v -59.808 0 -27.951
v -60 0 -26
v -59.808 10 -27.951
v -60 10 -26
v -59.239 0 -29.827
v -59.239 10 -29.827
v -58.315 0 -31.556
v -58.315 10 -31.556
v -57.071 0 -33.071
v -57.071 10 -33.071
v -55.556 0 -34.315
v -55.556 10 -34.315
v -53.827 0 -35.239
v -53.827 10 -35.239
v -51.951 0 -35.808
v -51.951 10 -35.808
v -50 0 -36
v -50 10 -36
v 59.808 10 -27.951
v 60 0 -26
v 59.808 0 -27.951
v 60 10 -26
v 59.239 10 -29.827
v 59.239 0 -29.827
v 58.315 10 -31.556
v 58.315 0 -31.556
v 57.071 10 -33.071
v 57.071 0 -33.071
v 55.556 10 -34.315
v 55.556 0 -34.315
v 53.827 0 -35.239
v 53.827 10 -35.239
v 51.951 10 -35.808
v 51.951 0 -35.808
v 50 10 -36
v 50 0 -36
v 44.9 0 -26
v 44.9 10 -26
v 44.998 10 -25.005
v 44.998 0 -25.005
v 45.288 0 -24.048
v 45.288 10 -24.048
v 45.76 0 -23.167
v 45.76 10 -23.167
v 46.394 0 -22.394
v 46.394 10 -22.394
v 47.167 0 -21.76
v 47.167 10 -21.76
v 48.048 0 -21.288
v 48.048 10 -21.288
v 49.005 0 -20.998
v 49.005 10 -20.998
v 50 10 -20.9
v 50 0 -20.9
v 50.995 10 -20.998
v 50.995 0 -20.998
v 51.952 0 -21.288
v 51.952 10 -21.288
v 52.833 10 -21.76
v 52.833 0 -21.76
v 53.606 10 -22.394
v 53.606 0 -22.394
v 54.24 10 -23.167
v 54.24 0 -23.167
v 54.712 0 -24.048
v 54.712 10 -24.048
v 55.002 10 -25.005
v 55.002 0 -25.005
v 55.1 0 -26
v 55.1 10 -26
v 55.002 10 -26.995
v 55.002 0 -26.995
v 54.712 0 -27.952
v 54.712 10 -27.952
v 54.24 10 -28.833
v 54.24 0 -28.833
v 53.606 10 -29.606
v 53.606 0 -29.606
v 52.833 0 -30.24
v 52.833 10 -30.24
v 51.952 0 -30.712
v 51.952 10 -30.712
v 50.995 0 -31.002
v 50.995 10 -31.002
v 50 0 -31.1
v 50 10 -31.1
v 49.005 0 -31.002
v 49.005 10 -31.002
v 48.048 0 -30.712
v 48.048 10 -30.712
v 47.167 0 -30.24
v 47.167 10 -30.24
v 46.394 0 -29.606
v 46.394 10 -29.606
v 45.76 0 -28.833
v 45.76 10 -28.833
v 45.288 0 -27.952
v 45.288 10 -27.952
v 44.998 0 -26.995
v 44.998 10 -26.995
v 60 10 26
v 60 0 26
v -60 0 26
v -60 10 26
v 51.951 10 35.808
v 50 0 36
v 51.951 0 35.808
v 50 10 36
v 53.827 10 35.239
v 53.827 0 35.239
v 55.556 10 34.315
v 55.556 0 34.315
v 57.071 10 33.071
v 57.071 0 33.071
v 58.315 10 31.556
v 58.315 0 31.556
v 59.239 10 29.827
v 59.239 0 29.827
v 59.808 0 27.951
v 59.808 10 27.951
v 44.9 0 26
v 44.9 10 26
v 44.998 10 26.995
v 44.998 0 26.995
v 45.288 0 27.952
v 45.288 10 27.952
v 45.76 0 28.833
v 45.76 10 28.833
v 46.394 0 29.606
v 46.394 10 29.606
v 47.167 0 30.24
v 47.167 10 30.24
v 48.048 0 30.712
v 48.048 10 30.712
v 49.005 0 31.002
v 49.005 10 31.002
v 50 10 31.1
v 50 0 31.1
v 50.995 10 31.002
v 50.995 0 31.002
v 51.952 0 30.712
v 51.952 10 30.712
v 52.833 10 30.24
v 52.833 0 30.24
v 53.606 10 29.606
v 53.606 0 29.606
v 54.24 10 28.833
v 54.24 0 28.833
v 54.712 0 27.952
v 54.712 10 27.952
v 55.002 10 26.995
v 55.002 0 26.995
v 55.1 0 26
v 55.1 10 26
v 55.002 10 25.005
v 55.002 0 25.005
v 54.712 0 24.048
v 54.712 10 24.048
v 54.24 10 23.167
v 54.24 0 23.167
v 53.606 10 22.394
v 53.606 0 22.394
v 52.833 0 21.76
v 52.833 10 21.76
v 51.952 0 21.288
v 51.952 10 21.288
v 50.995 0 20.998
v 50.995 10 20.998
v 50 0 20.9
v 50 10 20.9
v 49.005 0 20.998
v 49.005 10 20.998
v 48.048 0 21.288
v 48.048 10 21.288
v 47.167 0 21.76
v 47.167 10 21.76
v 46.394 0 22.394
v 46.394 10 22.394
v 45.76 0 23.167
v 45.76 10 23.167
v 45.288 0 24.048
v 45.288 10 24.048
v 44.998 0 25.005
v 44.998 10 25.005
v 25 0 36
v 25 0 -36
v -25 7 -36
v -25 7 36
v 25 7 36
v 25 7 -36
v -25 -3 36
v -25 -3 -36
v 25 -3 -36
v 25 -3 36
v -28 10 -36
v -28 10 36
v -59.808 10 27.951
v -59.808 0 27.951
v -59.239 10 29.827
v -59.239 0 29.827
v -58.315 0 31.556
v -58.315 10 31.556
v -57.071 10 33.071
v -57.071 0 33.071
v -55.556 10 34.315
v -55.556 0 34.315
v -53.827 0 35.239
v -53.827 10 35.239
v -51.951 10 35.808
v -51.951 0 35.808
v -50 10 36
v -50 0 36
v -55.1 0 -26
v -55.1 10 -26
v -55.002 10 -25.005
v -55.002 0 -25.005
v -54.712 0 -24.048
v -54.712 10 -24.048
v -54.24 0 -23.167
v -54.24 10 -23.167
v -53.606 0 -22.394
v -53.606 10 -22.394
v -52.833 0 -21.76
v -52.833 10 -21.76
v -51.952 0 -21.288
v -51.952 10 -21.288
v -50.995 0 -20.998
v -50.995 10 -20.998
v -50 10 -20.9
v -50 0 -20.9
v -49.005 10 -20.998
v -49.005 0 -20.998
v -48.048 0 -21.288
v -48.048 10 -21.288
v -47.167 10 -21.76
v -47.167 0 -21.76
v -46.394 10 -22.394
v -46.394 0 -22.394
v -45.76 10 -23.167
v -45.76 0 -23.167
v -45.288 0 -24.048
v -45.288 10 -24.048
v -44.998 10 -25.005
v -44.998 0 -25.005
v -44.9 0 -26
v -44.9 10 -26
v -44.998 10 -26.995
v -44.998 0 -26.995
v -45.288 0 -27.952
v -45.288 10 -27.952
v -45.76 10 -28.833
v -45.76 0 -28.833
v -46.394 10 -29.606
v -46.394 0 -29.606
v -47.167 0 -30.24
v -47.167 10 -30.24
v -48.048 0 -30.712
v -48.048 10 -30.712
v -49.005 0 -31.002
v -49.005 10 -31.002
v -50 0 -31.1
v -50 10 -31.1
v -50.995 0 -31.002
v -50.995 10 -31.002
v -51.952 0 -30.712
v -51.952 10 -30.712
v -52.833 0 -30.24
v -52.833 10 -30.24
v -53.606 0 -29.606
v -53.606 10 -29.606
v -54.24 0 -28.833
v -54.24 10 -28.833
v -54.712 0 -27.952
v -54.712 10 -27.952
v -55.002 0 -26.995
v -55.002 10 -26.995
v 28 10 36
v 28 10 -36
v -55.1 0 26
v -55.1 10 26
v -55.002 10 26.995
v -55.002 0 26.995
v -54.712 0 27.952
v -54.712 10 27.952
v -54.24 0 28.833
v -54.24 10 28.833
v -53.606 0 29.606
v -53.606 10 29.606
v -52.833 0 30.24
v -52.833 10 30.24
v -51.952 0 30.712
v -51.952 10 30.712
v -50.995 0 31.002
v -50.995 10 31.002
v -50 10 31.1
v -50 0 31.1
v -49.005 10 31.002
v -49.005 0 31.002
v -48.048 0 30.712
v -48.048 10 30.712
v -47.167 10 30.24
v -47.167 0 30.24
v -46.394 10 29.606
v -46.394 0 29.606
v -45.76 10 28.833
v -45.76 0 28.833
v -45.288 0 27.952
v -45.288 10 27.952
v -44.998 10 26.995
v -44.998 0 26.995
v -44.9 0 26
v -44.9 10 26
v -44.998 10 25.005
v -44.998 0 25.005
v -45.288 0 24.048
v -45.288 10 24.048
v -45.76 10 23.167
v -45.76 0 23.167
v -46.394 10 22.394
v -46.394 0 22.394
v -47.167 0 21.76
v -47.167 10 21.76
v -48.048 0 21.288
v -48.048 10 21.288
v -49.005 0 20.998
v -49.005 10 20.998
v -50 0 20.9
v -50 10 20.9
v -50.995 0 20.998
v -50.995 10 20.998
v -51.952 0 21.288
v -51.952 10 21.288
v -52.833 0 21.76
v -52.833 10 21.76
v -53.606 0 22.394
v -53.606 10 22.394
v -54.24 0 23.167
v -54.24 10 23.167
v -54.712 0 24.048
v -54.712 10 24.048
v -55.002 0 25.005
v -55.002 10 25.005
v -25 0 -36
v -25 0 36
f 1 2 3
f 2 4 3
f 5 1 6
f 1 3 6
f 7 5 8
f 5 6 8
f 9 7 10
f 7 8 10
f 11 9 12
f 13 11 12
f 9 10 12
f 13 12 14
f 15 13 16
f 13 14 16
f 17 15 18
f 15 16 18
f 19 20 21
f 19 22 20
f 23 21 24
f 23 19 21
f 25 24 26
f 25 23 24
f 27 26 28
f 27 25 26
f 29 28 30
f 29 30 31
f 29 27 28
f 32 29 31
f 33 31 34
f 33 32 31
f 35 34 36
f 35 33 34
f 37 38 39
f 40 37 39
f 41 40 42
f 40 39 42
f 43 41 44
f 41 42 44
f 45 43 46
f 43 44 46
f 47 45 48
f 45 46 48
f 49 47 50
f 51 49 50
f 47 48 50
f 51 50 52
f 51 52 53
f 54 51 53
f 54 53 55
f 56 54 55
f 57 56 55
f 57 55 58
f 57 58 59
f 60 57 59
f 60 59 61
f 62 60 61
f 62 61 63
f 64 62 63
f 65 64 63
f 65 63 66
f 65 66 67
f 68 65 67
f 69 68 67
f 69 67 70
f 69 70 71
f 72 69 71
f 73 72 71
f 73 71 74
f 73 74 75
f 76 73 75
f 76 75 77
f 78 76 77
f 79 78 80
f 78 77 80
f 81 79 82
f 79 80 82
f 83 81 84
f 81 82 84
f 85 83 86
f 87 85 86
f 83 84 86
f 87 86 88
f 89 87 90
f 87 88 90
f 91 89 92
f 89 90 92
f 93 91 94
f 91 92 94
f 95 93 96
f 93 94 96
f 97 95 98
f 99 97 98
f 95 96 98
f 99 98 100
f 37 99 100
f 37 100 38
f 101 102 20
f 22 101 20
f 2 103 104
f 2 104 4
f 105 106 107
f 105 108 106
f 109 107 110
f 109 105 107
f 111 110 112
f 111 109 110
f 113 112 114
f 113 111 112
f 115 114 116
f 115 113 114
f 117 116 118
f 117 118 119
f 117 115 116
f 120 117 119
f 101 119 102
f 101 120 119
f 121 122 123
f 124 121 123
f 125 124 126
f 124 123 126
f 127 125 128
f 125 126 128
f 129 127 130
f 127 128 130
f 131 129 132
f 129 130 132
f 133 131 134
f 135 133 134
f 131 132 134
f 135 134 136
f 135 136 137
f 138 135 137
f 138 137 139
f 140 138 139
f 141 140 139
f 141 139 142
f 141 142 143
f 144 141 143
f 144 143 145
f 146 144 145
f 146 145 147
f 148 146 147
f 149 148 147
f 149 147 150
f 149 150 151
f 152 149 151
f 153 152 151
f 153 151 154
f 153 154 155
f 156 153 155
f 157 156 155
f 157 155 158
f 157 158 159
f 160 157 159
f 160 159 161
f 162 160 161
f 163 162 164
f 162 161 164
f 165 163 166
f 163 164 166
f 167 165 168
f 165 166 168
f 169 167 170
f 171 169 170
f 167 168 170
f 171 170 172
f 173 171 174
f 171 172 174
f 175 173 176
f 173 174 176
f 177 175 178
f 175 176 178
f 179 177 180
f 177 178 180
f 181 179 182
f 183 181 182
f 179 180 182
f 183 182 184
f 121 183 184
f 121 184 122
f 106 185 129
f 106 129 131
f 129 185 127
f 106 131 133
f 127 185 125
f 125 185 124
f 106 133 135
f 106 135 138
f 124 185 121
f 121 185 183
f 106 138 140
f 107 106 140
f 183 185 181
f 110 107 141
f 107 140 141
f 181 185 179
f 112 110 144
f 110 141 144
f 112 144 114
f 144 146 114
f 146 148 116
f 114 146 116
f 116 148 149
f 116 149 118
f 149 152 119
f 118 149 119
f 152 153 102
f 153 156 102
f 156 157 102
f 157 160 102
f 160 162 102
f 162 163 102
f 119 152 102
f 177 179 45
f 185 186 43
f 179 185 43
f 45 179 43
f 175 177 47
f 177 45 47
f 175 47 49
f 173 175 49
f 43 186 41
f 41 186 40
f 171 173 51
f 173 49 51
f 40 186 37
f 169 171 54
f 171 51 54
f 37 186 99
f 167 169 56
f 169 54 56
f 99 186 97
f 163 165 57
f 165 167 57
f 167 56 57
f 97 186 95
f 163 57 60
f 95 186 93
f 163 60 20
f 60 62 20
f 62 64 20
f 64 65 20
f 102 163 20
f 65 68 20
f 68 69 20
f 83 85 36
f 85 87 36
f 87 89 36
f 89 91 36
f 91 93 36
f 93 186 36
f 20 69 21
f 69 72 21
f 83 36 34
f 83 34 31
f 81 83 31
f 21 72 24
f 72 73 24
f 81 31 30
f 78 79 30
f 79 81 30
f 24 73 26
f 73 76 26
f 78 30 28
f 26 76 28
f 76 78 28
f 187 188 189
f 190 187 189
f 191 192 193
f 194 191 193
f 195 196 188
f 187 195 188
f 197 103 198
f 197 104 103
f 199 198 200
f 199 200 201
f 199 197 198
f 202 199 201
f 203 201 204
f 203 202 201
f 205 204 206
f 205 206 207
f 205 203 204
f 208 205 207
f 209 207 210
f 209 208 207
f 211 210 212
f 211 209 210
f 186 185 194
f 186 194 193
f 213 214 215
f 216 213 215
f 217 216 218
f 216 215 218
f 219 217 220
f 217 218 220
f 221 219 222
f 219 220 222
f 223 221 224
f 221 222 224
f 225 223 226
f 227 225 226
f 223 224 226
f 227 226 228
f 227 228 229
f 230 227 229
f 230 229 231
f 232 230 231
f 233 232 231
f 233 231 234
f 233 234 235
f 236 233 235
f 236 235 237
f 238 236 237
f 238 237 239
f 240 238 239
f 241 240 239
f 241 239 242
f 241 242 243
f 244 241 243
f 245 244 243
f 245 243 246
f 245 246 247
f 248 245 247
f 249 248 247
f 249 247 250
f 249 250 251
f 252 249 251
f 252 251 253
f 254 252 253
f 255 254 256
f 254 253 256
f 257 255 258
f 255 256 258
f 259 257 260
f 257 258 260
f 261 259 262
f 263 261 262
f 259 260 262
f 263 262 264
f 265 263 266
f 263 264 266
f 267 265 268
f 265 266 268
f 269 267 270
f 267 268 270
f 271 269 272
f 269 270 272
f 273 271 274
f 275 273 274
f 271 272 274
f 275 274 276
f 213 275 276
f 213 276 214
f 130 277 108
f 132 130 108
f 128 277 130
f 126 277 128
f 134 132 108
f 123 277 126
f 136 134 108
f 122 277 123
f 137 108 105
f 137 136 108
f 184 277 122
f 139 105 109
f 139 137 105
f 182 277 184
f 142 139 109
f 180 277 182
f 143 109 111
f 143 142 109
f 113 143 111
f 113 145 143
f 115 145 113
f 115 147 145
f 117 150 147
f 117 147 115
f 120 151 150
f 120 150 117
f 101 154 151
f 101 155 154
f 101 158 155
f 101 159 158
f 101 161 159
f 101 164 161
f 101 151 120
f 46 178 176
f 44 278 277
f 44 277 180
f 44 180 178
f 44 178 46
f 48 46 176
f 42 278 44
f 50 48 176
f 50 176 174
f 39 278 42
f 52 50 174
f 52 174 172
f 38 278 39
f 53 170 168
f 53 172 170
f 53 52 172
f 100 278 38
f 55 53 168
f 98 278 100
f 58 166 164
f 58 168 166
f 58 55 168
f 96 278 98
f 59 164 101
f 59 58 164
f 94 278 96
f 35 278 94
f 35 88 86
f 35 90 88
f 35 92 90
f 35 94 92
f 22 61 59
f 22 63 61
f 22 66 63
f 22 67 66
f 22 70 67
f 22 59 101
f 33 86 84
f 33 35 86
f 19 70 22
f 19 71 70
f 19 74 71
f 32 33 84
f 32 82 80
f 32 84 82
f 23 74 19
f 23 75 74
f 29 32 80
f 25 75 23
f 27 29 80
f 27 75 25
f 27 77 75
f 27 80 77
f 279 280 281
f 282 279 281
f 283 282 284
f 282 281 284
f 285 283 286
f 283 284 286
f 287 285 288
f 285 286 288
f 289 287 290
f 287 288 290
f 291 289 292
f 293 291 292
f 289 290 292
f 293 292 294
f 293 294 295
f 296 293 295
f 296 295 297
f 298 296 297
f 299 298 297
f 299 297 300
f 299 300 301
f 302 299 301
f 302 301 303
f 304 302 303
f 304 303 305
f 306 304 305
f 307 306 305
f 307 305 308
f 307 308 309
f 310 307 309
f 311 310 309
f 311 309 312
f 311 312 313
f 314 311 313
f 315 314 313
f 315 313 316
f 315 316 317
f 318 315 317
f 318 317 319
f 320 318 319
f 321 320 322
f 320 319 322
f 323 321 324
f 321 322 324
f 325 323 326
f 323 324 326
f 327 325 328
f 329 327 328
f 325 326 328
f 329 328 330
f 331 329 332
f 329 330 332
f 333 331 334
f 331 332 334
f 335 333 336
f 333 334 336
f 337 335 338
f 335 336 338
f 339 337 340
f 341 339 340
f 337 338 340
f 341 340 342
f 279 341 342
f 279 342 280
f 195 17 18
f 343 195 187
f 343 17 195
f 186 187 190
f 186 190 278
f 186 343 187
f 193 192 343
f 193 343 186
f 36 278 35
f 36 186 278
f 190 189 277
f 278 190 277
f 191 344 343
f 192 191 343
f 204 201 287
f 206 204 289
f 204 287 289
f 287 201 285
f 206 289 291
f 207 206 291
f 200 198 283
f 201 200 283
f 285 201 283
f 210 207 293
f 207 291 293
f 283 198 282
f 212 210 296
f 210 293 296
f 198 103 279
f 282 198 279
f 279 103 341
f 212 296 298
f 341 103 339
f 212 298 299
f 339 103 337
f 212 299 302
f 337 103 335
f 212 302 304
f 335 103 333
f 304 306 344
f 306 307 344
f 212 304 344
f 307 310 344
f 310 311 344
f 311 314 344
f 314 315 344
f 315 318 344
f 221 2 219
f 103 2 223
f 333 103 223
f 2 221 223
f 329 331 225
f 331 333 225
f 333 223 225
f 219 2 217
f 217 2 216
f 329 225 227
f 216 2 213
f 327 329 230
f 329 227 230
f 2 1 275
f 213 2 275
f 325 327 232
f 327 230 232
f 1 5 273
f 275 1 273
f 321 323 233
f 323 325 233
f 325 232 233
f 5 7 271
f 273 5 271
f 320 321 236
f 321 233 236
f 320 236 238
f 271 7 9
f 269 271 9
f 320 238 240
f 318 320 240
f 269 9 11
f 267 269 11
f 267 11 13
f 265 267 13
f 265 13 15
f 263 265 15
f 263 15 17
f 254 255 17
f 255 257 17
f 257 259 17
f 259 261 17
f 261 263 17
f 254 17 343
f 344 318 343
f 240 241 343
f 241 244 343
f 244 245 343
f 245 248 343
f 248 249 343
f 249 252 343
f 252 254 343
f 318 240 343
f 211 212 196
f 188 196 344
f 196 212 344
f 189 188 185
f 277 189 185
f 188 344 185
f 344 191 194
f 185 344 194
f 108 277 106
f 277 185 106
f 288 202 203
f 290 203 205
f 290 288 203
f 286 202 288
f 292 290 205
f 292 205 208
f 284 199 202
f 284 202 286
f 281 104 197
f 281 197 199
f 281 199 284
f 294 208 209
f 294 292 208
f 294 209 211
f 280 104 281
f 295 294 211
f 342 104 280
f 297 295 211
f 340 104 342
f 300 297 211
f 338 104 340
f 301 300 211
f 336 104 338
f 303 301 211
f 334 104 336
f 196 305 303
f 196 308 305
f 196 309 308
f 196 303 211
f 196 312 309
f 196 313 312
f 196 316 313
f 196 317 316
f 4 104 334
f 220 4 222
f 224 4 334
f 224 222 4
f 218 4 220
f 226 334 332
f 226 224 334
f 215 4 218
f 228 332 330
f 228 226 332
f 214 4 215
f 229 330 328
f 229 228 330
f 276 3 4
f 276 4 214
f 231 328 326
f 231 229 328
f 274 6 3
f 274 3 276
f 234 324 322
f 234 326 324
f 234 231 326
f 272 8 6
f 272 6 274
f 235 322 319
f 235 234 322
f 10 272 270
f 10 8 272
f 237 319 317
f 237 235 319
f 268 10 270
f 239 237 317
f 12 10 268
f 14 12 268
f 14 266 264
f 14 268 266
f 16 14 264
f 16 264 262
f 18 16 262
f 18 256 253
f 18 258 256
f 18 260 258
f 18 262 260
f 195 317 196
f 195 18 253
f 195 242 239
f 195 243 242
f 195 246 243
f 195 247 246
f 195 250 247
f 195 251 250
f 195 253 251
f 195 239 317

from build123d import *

# Parameters (mm, degrees)
SKETCH1_W              = 120
SKETCH1_H              = 72
BOSS_EXTRUDE1_DEPTH    = 10
FILLET1_R              = 10
M12_TAPPED_HOLE1_D     = 10.2
M12_TAPPED_HOLE1_DEPTH = 10
SKETCH6_W              = 50
SKETCH6_H              = 72
BOSS_EXTRUDE2_DEPTH    = 3
CUT_EXTRUDE1_DEPTH     = 73


with BuildPart() as part:
    # Sketch1 → Boss-Extrude1 (new body)
    with BuildSketch(Plane(origin=(0, 0, 0), x_dir=(1, 0, 0), z_dir=(0, 1, 0))):
        Rectangle(SKETCH1_W, SKETCH1_H)
    extrude(amount=BOSS_EXTRUDE1_DEPTH)

    # Fillet1
    fillet1_edges = [part.edges().sort_by_distance(p)[0] for p in [
        (60, 5, 36),
        (-60, 5, 36),
        (-60, 5, -36),
        (60, 5, -36),
    ]]
    fillet(fillet1_edges, radius=FILLET1_R)

    # M12 Tapped Hole1
    with Locations(Plane.XZ):
        with Locations((50, -26), (50, 26), (-50, 26), (-50, -26)):
            Hole(M12_TAPPED_HOLE1_D / 2, depth=M12_TAPPED_HOLE1_DEPTH)

    # Sketch6 → Boss-Extrude2 (add)
    with BuildSketch(Plane(origin=(0, 0, 0), x_dir=(1, 0, 0), z_dir=(0, 1, 0))):
        Rectangle(SKETCH6_W, SKETCH6_H)
    extrude(amount=-BOSS_EXTRUDE2_DEPTH)

    # Sketch11 → Cut-Extrude1 (cut, through all)
    with BuildSketch(Plane.XY.offset(36)):
        Polygon((-28, 10), (-25, 7), (25, 7), (28, 10), align=None)
    extrude(amount=-CUT_EXTRUDE1_DEPTH, mode=Mode.SUBTRACT)


solid = part.part
